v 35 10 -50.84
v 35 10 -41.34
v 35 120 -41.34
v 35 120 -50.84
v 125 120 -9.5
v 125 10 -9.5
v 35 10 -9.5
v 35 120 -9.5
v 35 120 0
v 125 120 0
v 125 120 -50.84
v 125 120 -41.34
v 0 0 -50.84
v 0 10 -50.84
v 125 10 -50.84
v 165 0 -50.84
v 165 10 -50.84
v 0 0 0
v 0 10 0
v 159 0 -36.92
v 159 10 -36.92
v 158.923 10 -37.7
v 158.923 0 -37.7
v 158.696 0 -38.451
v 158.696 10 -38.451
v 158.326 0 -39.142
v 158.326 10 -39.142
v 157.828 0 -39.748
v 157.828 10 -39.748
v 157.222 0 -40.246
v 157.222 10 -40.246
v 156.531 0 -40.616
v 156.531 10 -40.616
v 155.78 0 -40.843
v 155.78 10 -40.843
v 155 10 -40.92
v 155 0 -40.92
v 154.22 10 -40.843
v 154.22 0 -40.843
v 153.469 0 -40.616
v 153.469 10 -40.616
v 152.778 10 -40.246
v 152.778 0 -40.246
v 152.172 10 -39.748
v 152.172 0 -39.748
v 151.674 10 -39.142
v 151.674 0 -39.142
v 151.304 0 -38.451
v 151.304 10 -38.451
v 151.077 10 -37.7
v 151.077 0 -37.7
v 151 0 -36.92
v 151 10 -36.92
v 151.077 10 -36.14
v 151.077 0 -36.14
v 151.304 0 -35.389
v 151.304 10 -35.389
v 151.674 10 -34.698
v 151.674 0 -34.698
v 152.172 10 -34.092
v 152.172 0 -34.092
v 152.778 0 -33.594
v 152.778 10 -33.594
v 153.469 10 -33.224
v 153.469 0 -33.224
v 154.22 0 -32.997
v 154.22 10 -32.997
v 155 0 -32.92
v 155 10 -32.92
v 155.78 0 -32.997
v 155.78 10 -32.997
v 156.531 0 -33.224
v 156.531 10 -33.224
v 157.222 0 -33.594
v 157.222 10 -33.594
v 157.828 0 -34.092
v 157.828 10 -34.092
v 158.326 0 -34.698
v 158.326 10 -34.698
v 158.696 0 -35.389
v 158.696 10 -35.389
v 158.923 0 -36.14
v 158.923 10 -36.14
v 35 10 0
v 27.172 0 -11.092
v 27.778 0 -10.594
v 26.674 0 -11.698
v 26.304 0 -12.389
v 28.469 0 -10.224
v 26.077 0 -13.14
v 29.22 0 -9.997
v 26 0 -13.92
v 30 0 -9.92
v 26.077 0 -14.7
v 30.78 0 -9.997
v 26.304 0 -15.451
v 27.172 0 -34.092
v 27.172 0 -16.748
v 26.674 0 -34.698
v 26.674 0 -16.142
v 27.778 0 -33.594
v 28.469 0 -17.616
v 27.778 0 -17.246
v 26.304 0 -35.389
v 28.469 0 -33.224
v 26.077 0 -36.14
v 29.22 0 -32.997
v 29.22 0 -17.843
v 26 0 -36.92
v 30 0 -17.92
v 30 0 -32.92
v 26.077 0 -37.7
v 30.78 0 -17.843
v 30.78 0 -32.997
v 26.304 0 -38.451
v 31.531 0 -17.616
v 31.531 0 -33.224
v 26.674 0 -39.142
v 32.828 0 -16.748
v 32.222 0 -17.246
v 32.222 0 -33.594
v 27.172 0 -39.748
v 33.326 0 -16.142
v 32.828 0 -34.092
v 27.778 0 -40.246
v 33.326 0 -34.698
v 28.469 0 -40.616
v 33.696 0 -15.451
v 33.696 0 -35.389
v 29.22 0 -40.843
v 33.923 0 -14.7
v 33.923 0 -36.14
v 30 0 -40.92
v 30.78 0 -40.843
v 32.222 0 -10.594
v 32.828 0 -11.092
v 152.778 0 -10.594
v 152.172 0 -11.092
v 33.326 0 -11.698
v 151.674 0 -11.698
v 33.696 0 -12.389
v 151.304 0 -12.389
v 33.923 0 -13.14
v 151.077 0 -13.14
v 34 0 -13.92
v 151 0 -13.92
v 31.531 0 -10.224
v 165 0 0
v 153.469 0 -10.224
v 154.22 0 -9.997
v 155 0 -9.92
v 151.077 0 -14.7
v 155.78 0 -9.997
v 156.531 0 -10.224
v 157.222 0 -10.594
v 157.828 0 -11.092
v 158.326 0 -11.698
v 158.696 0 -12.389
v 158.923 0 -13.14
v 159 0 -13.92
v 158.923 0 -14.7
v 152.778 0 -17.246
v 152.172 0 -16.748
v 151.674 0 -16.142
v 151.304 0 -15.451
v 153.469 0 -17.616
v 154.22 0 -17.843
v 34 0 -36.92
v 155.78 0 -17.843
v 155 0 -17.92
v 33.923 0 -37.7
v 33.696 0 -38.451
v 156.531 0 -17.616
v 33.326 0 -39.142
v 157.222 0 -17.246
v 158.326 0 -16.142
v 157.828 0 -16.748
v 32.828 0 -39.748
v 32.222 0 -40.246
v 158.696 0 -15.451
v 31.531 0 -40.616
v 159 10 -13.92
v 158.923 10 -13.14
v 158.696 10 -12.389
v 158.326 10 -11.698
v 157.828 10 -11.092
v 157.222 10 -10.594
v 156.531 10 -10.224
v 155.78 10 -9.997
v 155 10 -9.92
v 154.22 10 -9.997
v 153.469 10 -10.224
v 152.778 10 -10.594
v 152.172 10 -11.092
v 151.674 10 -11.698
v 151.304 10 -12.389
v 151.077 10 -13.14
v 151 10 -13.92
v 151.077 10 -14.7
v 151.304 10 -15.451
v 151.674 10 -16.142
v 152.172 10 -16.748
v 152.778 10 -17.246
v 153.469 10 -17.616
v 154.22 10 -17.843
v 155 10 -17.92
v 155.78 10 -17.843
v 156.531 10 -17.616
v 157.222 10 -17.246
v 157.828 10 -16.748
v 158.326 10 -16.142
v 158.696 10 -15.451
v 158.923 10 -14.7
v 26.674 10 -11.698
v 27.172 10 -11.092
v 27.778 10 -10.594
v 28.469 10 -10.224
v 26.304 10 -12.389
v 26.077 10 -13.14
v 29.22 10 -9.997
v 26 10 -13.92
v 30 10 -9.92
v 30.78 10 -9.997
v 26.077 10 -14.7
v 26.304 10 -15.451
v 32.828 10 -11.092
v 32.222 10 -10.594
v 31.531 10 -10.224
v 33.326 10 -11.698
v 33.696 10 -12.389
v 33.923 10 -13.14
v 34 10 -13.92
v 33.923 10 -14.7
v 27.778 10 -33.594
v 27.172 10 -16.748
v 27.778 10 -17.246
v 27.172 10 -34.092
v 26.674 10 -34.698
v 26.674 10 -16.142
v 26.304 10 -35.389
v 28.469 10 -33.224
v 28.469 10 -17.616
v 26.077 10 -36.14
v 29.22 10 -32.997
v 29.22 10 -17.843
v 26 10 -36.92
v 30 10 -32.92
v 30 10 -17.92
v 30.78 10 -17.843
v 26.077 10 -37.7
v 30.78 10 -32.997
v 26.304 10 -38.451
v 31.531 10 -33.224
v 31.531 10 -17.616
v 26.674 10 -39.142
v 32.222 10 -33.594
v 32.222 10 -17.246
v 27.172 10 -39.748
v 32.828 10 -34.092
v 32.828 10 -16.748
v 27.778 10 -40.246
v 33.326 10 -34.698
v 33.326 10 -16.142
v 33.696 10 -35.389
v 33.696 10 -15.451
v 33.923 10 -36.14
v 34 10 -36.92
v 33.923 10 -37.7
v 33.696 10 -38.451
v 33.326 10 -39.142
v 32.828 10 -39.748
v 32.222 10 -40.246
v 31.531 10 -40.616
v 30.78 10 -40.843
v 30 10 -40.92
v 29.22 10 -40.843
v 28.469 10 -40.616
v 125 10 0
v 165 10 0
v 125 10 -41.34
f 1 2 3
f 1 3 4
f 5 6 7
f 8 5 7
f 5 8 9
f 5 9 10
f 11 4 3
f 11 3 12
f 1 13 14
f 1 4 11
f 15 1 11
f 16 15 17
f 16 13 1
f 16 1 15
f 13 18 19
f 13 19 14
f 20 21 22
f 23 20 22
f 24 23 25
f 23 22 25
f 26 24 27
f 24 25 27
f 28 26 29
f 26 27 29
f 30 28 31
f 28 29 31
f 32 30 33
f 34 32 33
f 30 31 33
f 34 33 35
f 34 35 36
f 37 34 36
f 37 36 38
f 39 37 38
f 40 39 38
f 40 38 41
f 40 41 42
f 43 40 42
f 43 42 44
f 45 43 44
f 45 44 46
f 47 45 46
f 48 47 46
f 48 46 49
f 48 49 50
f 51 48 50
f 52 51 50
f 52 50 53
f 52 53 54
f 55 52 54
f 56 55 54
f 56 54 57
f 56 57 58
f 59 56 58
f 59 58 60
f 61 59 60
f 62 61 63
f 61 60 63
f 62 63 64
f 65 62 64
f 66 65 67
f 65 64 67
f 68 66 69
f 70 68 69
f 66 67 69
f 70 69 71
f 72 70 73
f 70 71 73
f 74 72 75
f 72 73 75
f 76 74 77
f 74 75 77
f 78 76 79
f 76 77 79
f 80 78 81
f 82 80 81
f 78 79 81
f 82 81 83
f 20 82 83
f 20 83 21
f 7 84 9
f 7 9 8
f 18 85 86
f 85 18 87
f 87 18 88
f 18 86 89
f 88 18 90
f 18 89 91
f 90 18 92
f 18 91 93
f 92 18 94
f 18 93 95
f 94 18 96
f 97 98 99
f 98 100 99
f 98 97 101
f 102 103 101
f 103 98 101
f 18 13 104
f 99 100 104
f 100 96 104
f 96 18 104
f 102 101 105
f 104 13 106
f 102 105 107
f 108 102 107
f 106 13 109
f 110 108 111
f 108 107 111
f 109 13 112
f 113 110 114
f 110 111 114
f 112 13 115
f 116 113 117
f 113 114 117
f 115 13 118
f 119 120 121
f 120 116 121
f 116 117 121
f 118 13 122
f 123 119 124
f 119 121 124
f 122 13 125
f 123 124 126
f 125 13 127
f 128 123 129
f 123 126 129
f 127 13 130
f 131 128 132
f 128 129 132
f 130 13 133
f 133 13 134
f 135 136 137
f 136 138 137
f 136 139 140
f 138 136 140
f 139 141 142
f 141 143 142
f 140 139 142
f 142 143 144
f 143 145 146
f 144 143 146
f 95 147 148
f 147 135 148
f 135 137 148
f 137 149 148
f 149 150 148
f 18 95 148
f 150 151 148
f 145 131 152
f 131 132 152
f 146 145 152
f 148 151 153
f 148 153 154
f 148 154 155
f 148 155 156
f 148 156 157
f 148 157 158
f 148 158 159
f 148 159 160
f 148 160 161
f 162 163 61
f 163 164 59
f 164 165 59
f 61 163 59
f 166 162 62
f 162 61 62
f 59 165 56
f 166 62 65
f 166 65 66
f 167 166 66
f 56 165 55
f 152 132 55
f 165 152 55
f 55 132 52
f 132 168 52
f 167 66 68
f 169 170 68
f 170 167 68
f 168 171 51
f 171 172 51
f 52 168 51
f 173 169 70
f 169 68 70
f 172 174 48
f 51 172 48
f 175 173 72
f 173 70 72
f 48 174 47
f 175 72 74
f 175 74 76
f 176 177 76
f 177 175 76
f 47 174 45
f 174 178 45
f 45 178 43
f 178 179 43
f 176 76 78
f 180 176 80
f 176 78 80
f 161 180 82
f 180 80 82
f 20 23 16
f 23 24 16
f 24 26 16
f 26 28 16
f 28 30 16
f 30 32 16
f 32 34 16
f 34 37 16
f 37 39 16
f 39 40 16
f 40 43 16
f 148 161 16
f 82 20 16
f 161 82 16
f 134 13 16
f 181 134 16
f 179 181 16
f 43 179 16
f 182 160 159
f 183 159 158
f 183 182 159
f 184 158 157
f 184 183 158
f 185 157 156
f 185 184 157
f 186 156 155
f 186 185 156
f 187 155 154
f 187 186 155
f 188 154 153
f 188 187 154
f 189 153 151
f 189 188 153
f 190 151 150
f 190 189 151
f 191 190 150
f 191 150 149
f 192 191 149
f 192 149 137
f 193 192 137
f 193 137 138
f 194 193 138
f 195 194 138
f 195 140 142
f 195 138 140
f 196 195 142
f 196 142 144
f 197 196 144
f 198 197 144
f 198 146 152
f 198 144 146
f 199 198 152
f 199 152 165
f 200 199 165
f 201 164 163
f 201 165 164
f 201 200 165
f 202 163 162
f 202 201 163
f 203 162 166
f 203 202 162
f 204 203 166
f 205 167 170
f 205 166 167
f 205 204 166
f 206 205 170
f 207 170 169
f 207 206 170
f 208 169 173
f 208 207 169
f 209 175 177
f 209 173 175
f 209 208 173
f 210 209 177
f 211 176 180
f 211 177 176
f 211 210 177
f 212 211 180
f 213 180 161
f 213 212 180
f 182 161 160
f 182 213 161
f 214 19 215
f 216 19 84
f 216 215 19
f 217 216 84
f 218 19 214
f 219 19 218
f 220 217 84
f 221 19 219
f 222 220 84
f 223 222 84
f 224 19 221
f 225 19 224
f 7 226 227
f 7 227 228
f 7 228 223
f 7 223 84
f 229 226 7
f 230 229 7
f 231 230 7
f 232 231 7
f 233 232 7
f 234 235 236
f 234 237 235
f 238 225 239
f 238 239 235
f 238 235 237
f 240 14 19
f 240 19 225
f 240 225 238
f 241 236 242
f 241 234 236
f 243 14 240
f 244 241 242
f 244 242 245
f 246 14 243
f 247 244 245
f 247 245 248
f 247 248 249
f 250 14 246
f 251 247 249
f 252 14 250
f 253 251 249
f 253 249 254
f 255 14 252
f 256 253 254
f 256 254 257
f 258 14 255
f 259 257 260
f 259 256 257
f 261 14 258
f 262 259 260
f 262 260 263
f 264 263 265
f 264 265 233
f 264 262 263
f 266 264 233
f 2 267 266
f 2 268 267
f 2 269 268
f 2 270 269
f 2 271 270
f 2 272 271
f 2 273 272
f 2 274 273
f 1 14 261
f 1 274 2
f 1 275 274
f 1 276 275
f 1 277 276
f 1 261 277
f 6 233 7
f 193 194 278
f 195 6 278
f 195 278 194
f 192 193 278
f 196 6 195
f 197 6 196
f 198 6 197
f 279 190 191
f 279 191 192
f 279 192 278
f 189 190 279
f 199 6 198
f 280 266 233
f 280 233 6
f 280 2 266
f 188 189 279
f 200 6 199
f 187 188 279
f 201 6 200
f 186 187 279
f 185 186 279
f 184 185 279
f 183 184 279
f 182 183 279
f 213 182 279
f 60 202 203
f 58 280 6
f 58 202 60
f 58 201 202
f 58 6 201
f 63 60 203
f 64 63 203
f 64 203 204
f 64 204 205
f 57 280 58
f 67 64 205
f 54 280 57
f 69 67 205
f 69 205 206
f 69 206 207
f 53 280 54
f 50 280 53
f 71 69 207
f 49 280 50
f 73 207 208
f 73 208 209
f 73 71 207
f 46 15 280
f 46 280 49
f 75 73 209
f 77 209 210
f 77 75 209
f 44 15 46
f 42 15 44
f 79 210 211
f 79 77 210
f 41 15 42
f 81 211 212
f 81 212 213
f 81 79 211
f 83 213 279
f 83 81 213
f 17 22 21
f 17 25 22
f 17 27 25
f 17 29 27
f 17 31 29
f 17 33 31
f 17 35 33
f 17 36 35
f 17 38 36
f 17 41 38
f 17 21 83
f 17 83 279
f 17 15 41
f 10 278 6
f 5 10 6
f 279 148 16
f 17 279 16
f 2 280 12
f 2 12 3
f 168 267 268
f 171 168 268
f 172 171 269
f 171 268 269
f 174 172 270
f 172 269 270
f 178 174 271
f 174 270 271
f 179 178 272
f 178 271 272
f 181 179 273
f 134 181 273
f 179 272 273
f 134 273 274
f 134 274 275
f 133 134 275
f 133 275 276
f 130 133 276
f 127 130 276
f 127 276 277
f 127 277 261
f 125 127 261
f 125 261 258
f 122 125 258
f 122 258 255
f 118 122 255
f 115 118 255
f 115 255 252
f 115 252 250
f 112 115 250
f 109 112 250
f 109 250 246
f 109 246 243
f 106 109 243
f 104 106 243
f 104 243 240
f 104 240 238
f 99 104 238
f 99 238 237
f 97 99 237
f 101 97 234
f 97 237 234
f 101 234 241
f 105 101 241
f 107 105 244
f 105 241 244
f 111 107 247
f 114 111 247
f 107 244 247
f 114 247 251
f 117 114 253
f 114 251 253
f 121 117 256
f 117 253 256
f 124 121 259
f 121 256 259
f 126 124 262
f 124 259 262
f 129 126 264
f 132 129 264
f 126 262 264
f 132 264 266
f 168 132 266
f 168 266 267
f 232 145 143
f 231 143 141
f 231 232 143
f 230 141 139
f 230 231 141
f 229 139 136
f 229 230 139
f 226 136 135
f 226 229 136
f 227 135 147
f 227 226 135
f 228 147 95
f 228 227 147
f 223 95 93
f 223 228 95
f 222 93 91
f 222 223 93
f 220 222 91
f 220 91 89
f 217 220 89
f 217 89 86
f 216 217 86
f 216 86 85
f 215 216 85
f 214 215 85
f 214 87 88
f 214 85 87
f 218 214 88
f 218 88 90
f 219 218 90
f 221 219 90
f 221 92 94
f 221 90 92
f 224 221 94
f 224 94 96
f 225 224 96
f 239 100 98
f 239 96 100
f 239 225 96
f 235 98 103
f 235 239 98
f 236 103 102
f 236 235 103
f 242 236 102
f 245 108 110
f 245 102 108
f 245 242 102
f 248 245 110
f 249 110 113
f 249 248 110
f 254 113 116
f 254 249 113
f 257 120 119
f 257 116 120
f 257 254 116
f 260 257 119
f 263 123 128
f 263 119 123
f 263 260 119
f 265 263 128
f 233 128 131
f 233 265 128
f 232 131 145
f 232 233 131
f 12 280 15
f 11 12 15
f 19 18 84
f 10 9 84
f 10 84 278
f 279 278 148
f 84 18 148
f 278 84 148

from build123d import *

# Parameters (mm, degrees)
SKETCH1_W           = 165
SKETCH1_H           = 50.84
BOSS_EXTRUDE1_DEPTH = 10
SKETCH2_W           = 90
SKETCH2_H           = 10
BOSS_EXTRUDE2_DEPTH = 110
SKETCH3_R           = 4
CUT_EXTRUDE1_DEPTH  = 30
SKETCH4_W           = 90
SKETCH4_H           = 110
CUT_EXTRUDE2_DEPTH  = 0.5


with BuildPart() as part:
    # Sketch1 → Boss-Extrude1 (new body)
    with BuildSketch(Plane(origin=(0, 0, 0), x_dir=(1, 0, 0), z_dir=(0, 1, 0))):
        with Locations((82.5, 25.42)):
            Rectangle(SKETCH1_W, SKETCH1_H)
    extrude(amount=BOSS_EXTRUDE1_DEPTH)

    # Sketch2 → Boss-Extrude2 (add)
    with BuildSketch(Plane(origin=(0, 10, 0), x_dir=(1, 0, 0), z_dir=(0, 1, 0))):
        with Locations((80, 45.84)):
            Rectangle(SKETCH2_W, SKETCH2_H)
        with Locations((80, 5)):
            Rectangle(SKETCH2_W, SKETCH2_H)
    extrude(amount=BOSS_EXTRUDE2_DEPTH)

    # Sketch3 → Cut-Extrude1 (cut)
    with BuildSketch(Plane(origin=(0, 10, 0), x_dir=(1, 0, 0), z_dir=(0, 1, 0))):
        with Locations((30, 36.92)):
            Circle(SKETCH3_R)
        with Locations((155, 36.92)):
            Circle(SKETCH3_R)
    cut_extrude1 = extrude(amount=-CUT_EXTRUDE1_DEPTH, mode=Mode.SUBTRACT)

    # Mirror1: Cut-Extrude1 across plane
    add(cut_extrude1.mirror(Plane(origin=(0, 0, -25.42), x_dir=(1, 0, 0), z_dir=(0, 0, -1))), mode=Mode.SUBTRACT)

    # Sketch4 → Cut-Extrude2 (cut)
    with BuildSketch(Plane(origin=(0, 0, -10), x_dir=(-1, 0, 0), z_dir=(0, 0, -1))):
        with Locations((-80, 65)):
            Rectangle(SKETCH4_W, SKETCH4_H)
    cut_extrude2 = extrude(amount=-CUT_EXTRUDE2_DEPTH, mode=Mode.SUBTRACT)

    # Mirror2: Cut-Extrude2 across plane
    add(cut_extrude2.mirror(Plane(origin=(0, 0, -25.42), x_dir=(1, 0, 0), z_dir=(0, 0, -1))), mode=Mode.SUBTRACT)


solid = part.part
